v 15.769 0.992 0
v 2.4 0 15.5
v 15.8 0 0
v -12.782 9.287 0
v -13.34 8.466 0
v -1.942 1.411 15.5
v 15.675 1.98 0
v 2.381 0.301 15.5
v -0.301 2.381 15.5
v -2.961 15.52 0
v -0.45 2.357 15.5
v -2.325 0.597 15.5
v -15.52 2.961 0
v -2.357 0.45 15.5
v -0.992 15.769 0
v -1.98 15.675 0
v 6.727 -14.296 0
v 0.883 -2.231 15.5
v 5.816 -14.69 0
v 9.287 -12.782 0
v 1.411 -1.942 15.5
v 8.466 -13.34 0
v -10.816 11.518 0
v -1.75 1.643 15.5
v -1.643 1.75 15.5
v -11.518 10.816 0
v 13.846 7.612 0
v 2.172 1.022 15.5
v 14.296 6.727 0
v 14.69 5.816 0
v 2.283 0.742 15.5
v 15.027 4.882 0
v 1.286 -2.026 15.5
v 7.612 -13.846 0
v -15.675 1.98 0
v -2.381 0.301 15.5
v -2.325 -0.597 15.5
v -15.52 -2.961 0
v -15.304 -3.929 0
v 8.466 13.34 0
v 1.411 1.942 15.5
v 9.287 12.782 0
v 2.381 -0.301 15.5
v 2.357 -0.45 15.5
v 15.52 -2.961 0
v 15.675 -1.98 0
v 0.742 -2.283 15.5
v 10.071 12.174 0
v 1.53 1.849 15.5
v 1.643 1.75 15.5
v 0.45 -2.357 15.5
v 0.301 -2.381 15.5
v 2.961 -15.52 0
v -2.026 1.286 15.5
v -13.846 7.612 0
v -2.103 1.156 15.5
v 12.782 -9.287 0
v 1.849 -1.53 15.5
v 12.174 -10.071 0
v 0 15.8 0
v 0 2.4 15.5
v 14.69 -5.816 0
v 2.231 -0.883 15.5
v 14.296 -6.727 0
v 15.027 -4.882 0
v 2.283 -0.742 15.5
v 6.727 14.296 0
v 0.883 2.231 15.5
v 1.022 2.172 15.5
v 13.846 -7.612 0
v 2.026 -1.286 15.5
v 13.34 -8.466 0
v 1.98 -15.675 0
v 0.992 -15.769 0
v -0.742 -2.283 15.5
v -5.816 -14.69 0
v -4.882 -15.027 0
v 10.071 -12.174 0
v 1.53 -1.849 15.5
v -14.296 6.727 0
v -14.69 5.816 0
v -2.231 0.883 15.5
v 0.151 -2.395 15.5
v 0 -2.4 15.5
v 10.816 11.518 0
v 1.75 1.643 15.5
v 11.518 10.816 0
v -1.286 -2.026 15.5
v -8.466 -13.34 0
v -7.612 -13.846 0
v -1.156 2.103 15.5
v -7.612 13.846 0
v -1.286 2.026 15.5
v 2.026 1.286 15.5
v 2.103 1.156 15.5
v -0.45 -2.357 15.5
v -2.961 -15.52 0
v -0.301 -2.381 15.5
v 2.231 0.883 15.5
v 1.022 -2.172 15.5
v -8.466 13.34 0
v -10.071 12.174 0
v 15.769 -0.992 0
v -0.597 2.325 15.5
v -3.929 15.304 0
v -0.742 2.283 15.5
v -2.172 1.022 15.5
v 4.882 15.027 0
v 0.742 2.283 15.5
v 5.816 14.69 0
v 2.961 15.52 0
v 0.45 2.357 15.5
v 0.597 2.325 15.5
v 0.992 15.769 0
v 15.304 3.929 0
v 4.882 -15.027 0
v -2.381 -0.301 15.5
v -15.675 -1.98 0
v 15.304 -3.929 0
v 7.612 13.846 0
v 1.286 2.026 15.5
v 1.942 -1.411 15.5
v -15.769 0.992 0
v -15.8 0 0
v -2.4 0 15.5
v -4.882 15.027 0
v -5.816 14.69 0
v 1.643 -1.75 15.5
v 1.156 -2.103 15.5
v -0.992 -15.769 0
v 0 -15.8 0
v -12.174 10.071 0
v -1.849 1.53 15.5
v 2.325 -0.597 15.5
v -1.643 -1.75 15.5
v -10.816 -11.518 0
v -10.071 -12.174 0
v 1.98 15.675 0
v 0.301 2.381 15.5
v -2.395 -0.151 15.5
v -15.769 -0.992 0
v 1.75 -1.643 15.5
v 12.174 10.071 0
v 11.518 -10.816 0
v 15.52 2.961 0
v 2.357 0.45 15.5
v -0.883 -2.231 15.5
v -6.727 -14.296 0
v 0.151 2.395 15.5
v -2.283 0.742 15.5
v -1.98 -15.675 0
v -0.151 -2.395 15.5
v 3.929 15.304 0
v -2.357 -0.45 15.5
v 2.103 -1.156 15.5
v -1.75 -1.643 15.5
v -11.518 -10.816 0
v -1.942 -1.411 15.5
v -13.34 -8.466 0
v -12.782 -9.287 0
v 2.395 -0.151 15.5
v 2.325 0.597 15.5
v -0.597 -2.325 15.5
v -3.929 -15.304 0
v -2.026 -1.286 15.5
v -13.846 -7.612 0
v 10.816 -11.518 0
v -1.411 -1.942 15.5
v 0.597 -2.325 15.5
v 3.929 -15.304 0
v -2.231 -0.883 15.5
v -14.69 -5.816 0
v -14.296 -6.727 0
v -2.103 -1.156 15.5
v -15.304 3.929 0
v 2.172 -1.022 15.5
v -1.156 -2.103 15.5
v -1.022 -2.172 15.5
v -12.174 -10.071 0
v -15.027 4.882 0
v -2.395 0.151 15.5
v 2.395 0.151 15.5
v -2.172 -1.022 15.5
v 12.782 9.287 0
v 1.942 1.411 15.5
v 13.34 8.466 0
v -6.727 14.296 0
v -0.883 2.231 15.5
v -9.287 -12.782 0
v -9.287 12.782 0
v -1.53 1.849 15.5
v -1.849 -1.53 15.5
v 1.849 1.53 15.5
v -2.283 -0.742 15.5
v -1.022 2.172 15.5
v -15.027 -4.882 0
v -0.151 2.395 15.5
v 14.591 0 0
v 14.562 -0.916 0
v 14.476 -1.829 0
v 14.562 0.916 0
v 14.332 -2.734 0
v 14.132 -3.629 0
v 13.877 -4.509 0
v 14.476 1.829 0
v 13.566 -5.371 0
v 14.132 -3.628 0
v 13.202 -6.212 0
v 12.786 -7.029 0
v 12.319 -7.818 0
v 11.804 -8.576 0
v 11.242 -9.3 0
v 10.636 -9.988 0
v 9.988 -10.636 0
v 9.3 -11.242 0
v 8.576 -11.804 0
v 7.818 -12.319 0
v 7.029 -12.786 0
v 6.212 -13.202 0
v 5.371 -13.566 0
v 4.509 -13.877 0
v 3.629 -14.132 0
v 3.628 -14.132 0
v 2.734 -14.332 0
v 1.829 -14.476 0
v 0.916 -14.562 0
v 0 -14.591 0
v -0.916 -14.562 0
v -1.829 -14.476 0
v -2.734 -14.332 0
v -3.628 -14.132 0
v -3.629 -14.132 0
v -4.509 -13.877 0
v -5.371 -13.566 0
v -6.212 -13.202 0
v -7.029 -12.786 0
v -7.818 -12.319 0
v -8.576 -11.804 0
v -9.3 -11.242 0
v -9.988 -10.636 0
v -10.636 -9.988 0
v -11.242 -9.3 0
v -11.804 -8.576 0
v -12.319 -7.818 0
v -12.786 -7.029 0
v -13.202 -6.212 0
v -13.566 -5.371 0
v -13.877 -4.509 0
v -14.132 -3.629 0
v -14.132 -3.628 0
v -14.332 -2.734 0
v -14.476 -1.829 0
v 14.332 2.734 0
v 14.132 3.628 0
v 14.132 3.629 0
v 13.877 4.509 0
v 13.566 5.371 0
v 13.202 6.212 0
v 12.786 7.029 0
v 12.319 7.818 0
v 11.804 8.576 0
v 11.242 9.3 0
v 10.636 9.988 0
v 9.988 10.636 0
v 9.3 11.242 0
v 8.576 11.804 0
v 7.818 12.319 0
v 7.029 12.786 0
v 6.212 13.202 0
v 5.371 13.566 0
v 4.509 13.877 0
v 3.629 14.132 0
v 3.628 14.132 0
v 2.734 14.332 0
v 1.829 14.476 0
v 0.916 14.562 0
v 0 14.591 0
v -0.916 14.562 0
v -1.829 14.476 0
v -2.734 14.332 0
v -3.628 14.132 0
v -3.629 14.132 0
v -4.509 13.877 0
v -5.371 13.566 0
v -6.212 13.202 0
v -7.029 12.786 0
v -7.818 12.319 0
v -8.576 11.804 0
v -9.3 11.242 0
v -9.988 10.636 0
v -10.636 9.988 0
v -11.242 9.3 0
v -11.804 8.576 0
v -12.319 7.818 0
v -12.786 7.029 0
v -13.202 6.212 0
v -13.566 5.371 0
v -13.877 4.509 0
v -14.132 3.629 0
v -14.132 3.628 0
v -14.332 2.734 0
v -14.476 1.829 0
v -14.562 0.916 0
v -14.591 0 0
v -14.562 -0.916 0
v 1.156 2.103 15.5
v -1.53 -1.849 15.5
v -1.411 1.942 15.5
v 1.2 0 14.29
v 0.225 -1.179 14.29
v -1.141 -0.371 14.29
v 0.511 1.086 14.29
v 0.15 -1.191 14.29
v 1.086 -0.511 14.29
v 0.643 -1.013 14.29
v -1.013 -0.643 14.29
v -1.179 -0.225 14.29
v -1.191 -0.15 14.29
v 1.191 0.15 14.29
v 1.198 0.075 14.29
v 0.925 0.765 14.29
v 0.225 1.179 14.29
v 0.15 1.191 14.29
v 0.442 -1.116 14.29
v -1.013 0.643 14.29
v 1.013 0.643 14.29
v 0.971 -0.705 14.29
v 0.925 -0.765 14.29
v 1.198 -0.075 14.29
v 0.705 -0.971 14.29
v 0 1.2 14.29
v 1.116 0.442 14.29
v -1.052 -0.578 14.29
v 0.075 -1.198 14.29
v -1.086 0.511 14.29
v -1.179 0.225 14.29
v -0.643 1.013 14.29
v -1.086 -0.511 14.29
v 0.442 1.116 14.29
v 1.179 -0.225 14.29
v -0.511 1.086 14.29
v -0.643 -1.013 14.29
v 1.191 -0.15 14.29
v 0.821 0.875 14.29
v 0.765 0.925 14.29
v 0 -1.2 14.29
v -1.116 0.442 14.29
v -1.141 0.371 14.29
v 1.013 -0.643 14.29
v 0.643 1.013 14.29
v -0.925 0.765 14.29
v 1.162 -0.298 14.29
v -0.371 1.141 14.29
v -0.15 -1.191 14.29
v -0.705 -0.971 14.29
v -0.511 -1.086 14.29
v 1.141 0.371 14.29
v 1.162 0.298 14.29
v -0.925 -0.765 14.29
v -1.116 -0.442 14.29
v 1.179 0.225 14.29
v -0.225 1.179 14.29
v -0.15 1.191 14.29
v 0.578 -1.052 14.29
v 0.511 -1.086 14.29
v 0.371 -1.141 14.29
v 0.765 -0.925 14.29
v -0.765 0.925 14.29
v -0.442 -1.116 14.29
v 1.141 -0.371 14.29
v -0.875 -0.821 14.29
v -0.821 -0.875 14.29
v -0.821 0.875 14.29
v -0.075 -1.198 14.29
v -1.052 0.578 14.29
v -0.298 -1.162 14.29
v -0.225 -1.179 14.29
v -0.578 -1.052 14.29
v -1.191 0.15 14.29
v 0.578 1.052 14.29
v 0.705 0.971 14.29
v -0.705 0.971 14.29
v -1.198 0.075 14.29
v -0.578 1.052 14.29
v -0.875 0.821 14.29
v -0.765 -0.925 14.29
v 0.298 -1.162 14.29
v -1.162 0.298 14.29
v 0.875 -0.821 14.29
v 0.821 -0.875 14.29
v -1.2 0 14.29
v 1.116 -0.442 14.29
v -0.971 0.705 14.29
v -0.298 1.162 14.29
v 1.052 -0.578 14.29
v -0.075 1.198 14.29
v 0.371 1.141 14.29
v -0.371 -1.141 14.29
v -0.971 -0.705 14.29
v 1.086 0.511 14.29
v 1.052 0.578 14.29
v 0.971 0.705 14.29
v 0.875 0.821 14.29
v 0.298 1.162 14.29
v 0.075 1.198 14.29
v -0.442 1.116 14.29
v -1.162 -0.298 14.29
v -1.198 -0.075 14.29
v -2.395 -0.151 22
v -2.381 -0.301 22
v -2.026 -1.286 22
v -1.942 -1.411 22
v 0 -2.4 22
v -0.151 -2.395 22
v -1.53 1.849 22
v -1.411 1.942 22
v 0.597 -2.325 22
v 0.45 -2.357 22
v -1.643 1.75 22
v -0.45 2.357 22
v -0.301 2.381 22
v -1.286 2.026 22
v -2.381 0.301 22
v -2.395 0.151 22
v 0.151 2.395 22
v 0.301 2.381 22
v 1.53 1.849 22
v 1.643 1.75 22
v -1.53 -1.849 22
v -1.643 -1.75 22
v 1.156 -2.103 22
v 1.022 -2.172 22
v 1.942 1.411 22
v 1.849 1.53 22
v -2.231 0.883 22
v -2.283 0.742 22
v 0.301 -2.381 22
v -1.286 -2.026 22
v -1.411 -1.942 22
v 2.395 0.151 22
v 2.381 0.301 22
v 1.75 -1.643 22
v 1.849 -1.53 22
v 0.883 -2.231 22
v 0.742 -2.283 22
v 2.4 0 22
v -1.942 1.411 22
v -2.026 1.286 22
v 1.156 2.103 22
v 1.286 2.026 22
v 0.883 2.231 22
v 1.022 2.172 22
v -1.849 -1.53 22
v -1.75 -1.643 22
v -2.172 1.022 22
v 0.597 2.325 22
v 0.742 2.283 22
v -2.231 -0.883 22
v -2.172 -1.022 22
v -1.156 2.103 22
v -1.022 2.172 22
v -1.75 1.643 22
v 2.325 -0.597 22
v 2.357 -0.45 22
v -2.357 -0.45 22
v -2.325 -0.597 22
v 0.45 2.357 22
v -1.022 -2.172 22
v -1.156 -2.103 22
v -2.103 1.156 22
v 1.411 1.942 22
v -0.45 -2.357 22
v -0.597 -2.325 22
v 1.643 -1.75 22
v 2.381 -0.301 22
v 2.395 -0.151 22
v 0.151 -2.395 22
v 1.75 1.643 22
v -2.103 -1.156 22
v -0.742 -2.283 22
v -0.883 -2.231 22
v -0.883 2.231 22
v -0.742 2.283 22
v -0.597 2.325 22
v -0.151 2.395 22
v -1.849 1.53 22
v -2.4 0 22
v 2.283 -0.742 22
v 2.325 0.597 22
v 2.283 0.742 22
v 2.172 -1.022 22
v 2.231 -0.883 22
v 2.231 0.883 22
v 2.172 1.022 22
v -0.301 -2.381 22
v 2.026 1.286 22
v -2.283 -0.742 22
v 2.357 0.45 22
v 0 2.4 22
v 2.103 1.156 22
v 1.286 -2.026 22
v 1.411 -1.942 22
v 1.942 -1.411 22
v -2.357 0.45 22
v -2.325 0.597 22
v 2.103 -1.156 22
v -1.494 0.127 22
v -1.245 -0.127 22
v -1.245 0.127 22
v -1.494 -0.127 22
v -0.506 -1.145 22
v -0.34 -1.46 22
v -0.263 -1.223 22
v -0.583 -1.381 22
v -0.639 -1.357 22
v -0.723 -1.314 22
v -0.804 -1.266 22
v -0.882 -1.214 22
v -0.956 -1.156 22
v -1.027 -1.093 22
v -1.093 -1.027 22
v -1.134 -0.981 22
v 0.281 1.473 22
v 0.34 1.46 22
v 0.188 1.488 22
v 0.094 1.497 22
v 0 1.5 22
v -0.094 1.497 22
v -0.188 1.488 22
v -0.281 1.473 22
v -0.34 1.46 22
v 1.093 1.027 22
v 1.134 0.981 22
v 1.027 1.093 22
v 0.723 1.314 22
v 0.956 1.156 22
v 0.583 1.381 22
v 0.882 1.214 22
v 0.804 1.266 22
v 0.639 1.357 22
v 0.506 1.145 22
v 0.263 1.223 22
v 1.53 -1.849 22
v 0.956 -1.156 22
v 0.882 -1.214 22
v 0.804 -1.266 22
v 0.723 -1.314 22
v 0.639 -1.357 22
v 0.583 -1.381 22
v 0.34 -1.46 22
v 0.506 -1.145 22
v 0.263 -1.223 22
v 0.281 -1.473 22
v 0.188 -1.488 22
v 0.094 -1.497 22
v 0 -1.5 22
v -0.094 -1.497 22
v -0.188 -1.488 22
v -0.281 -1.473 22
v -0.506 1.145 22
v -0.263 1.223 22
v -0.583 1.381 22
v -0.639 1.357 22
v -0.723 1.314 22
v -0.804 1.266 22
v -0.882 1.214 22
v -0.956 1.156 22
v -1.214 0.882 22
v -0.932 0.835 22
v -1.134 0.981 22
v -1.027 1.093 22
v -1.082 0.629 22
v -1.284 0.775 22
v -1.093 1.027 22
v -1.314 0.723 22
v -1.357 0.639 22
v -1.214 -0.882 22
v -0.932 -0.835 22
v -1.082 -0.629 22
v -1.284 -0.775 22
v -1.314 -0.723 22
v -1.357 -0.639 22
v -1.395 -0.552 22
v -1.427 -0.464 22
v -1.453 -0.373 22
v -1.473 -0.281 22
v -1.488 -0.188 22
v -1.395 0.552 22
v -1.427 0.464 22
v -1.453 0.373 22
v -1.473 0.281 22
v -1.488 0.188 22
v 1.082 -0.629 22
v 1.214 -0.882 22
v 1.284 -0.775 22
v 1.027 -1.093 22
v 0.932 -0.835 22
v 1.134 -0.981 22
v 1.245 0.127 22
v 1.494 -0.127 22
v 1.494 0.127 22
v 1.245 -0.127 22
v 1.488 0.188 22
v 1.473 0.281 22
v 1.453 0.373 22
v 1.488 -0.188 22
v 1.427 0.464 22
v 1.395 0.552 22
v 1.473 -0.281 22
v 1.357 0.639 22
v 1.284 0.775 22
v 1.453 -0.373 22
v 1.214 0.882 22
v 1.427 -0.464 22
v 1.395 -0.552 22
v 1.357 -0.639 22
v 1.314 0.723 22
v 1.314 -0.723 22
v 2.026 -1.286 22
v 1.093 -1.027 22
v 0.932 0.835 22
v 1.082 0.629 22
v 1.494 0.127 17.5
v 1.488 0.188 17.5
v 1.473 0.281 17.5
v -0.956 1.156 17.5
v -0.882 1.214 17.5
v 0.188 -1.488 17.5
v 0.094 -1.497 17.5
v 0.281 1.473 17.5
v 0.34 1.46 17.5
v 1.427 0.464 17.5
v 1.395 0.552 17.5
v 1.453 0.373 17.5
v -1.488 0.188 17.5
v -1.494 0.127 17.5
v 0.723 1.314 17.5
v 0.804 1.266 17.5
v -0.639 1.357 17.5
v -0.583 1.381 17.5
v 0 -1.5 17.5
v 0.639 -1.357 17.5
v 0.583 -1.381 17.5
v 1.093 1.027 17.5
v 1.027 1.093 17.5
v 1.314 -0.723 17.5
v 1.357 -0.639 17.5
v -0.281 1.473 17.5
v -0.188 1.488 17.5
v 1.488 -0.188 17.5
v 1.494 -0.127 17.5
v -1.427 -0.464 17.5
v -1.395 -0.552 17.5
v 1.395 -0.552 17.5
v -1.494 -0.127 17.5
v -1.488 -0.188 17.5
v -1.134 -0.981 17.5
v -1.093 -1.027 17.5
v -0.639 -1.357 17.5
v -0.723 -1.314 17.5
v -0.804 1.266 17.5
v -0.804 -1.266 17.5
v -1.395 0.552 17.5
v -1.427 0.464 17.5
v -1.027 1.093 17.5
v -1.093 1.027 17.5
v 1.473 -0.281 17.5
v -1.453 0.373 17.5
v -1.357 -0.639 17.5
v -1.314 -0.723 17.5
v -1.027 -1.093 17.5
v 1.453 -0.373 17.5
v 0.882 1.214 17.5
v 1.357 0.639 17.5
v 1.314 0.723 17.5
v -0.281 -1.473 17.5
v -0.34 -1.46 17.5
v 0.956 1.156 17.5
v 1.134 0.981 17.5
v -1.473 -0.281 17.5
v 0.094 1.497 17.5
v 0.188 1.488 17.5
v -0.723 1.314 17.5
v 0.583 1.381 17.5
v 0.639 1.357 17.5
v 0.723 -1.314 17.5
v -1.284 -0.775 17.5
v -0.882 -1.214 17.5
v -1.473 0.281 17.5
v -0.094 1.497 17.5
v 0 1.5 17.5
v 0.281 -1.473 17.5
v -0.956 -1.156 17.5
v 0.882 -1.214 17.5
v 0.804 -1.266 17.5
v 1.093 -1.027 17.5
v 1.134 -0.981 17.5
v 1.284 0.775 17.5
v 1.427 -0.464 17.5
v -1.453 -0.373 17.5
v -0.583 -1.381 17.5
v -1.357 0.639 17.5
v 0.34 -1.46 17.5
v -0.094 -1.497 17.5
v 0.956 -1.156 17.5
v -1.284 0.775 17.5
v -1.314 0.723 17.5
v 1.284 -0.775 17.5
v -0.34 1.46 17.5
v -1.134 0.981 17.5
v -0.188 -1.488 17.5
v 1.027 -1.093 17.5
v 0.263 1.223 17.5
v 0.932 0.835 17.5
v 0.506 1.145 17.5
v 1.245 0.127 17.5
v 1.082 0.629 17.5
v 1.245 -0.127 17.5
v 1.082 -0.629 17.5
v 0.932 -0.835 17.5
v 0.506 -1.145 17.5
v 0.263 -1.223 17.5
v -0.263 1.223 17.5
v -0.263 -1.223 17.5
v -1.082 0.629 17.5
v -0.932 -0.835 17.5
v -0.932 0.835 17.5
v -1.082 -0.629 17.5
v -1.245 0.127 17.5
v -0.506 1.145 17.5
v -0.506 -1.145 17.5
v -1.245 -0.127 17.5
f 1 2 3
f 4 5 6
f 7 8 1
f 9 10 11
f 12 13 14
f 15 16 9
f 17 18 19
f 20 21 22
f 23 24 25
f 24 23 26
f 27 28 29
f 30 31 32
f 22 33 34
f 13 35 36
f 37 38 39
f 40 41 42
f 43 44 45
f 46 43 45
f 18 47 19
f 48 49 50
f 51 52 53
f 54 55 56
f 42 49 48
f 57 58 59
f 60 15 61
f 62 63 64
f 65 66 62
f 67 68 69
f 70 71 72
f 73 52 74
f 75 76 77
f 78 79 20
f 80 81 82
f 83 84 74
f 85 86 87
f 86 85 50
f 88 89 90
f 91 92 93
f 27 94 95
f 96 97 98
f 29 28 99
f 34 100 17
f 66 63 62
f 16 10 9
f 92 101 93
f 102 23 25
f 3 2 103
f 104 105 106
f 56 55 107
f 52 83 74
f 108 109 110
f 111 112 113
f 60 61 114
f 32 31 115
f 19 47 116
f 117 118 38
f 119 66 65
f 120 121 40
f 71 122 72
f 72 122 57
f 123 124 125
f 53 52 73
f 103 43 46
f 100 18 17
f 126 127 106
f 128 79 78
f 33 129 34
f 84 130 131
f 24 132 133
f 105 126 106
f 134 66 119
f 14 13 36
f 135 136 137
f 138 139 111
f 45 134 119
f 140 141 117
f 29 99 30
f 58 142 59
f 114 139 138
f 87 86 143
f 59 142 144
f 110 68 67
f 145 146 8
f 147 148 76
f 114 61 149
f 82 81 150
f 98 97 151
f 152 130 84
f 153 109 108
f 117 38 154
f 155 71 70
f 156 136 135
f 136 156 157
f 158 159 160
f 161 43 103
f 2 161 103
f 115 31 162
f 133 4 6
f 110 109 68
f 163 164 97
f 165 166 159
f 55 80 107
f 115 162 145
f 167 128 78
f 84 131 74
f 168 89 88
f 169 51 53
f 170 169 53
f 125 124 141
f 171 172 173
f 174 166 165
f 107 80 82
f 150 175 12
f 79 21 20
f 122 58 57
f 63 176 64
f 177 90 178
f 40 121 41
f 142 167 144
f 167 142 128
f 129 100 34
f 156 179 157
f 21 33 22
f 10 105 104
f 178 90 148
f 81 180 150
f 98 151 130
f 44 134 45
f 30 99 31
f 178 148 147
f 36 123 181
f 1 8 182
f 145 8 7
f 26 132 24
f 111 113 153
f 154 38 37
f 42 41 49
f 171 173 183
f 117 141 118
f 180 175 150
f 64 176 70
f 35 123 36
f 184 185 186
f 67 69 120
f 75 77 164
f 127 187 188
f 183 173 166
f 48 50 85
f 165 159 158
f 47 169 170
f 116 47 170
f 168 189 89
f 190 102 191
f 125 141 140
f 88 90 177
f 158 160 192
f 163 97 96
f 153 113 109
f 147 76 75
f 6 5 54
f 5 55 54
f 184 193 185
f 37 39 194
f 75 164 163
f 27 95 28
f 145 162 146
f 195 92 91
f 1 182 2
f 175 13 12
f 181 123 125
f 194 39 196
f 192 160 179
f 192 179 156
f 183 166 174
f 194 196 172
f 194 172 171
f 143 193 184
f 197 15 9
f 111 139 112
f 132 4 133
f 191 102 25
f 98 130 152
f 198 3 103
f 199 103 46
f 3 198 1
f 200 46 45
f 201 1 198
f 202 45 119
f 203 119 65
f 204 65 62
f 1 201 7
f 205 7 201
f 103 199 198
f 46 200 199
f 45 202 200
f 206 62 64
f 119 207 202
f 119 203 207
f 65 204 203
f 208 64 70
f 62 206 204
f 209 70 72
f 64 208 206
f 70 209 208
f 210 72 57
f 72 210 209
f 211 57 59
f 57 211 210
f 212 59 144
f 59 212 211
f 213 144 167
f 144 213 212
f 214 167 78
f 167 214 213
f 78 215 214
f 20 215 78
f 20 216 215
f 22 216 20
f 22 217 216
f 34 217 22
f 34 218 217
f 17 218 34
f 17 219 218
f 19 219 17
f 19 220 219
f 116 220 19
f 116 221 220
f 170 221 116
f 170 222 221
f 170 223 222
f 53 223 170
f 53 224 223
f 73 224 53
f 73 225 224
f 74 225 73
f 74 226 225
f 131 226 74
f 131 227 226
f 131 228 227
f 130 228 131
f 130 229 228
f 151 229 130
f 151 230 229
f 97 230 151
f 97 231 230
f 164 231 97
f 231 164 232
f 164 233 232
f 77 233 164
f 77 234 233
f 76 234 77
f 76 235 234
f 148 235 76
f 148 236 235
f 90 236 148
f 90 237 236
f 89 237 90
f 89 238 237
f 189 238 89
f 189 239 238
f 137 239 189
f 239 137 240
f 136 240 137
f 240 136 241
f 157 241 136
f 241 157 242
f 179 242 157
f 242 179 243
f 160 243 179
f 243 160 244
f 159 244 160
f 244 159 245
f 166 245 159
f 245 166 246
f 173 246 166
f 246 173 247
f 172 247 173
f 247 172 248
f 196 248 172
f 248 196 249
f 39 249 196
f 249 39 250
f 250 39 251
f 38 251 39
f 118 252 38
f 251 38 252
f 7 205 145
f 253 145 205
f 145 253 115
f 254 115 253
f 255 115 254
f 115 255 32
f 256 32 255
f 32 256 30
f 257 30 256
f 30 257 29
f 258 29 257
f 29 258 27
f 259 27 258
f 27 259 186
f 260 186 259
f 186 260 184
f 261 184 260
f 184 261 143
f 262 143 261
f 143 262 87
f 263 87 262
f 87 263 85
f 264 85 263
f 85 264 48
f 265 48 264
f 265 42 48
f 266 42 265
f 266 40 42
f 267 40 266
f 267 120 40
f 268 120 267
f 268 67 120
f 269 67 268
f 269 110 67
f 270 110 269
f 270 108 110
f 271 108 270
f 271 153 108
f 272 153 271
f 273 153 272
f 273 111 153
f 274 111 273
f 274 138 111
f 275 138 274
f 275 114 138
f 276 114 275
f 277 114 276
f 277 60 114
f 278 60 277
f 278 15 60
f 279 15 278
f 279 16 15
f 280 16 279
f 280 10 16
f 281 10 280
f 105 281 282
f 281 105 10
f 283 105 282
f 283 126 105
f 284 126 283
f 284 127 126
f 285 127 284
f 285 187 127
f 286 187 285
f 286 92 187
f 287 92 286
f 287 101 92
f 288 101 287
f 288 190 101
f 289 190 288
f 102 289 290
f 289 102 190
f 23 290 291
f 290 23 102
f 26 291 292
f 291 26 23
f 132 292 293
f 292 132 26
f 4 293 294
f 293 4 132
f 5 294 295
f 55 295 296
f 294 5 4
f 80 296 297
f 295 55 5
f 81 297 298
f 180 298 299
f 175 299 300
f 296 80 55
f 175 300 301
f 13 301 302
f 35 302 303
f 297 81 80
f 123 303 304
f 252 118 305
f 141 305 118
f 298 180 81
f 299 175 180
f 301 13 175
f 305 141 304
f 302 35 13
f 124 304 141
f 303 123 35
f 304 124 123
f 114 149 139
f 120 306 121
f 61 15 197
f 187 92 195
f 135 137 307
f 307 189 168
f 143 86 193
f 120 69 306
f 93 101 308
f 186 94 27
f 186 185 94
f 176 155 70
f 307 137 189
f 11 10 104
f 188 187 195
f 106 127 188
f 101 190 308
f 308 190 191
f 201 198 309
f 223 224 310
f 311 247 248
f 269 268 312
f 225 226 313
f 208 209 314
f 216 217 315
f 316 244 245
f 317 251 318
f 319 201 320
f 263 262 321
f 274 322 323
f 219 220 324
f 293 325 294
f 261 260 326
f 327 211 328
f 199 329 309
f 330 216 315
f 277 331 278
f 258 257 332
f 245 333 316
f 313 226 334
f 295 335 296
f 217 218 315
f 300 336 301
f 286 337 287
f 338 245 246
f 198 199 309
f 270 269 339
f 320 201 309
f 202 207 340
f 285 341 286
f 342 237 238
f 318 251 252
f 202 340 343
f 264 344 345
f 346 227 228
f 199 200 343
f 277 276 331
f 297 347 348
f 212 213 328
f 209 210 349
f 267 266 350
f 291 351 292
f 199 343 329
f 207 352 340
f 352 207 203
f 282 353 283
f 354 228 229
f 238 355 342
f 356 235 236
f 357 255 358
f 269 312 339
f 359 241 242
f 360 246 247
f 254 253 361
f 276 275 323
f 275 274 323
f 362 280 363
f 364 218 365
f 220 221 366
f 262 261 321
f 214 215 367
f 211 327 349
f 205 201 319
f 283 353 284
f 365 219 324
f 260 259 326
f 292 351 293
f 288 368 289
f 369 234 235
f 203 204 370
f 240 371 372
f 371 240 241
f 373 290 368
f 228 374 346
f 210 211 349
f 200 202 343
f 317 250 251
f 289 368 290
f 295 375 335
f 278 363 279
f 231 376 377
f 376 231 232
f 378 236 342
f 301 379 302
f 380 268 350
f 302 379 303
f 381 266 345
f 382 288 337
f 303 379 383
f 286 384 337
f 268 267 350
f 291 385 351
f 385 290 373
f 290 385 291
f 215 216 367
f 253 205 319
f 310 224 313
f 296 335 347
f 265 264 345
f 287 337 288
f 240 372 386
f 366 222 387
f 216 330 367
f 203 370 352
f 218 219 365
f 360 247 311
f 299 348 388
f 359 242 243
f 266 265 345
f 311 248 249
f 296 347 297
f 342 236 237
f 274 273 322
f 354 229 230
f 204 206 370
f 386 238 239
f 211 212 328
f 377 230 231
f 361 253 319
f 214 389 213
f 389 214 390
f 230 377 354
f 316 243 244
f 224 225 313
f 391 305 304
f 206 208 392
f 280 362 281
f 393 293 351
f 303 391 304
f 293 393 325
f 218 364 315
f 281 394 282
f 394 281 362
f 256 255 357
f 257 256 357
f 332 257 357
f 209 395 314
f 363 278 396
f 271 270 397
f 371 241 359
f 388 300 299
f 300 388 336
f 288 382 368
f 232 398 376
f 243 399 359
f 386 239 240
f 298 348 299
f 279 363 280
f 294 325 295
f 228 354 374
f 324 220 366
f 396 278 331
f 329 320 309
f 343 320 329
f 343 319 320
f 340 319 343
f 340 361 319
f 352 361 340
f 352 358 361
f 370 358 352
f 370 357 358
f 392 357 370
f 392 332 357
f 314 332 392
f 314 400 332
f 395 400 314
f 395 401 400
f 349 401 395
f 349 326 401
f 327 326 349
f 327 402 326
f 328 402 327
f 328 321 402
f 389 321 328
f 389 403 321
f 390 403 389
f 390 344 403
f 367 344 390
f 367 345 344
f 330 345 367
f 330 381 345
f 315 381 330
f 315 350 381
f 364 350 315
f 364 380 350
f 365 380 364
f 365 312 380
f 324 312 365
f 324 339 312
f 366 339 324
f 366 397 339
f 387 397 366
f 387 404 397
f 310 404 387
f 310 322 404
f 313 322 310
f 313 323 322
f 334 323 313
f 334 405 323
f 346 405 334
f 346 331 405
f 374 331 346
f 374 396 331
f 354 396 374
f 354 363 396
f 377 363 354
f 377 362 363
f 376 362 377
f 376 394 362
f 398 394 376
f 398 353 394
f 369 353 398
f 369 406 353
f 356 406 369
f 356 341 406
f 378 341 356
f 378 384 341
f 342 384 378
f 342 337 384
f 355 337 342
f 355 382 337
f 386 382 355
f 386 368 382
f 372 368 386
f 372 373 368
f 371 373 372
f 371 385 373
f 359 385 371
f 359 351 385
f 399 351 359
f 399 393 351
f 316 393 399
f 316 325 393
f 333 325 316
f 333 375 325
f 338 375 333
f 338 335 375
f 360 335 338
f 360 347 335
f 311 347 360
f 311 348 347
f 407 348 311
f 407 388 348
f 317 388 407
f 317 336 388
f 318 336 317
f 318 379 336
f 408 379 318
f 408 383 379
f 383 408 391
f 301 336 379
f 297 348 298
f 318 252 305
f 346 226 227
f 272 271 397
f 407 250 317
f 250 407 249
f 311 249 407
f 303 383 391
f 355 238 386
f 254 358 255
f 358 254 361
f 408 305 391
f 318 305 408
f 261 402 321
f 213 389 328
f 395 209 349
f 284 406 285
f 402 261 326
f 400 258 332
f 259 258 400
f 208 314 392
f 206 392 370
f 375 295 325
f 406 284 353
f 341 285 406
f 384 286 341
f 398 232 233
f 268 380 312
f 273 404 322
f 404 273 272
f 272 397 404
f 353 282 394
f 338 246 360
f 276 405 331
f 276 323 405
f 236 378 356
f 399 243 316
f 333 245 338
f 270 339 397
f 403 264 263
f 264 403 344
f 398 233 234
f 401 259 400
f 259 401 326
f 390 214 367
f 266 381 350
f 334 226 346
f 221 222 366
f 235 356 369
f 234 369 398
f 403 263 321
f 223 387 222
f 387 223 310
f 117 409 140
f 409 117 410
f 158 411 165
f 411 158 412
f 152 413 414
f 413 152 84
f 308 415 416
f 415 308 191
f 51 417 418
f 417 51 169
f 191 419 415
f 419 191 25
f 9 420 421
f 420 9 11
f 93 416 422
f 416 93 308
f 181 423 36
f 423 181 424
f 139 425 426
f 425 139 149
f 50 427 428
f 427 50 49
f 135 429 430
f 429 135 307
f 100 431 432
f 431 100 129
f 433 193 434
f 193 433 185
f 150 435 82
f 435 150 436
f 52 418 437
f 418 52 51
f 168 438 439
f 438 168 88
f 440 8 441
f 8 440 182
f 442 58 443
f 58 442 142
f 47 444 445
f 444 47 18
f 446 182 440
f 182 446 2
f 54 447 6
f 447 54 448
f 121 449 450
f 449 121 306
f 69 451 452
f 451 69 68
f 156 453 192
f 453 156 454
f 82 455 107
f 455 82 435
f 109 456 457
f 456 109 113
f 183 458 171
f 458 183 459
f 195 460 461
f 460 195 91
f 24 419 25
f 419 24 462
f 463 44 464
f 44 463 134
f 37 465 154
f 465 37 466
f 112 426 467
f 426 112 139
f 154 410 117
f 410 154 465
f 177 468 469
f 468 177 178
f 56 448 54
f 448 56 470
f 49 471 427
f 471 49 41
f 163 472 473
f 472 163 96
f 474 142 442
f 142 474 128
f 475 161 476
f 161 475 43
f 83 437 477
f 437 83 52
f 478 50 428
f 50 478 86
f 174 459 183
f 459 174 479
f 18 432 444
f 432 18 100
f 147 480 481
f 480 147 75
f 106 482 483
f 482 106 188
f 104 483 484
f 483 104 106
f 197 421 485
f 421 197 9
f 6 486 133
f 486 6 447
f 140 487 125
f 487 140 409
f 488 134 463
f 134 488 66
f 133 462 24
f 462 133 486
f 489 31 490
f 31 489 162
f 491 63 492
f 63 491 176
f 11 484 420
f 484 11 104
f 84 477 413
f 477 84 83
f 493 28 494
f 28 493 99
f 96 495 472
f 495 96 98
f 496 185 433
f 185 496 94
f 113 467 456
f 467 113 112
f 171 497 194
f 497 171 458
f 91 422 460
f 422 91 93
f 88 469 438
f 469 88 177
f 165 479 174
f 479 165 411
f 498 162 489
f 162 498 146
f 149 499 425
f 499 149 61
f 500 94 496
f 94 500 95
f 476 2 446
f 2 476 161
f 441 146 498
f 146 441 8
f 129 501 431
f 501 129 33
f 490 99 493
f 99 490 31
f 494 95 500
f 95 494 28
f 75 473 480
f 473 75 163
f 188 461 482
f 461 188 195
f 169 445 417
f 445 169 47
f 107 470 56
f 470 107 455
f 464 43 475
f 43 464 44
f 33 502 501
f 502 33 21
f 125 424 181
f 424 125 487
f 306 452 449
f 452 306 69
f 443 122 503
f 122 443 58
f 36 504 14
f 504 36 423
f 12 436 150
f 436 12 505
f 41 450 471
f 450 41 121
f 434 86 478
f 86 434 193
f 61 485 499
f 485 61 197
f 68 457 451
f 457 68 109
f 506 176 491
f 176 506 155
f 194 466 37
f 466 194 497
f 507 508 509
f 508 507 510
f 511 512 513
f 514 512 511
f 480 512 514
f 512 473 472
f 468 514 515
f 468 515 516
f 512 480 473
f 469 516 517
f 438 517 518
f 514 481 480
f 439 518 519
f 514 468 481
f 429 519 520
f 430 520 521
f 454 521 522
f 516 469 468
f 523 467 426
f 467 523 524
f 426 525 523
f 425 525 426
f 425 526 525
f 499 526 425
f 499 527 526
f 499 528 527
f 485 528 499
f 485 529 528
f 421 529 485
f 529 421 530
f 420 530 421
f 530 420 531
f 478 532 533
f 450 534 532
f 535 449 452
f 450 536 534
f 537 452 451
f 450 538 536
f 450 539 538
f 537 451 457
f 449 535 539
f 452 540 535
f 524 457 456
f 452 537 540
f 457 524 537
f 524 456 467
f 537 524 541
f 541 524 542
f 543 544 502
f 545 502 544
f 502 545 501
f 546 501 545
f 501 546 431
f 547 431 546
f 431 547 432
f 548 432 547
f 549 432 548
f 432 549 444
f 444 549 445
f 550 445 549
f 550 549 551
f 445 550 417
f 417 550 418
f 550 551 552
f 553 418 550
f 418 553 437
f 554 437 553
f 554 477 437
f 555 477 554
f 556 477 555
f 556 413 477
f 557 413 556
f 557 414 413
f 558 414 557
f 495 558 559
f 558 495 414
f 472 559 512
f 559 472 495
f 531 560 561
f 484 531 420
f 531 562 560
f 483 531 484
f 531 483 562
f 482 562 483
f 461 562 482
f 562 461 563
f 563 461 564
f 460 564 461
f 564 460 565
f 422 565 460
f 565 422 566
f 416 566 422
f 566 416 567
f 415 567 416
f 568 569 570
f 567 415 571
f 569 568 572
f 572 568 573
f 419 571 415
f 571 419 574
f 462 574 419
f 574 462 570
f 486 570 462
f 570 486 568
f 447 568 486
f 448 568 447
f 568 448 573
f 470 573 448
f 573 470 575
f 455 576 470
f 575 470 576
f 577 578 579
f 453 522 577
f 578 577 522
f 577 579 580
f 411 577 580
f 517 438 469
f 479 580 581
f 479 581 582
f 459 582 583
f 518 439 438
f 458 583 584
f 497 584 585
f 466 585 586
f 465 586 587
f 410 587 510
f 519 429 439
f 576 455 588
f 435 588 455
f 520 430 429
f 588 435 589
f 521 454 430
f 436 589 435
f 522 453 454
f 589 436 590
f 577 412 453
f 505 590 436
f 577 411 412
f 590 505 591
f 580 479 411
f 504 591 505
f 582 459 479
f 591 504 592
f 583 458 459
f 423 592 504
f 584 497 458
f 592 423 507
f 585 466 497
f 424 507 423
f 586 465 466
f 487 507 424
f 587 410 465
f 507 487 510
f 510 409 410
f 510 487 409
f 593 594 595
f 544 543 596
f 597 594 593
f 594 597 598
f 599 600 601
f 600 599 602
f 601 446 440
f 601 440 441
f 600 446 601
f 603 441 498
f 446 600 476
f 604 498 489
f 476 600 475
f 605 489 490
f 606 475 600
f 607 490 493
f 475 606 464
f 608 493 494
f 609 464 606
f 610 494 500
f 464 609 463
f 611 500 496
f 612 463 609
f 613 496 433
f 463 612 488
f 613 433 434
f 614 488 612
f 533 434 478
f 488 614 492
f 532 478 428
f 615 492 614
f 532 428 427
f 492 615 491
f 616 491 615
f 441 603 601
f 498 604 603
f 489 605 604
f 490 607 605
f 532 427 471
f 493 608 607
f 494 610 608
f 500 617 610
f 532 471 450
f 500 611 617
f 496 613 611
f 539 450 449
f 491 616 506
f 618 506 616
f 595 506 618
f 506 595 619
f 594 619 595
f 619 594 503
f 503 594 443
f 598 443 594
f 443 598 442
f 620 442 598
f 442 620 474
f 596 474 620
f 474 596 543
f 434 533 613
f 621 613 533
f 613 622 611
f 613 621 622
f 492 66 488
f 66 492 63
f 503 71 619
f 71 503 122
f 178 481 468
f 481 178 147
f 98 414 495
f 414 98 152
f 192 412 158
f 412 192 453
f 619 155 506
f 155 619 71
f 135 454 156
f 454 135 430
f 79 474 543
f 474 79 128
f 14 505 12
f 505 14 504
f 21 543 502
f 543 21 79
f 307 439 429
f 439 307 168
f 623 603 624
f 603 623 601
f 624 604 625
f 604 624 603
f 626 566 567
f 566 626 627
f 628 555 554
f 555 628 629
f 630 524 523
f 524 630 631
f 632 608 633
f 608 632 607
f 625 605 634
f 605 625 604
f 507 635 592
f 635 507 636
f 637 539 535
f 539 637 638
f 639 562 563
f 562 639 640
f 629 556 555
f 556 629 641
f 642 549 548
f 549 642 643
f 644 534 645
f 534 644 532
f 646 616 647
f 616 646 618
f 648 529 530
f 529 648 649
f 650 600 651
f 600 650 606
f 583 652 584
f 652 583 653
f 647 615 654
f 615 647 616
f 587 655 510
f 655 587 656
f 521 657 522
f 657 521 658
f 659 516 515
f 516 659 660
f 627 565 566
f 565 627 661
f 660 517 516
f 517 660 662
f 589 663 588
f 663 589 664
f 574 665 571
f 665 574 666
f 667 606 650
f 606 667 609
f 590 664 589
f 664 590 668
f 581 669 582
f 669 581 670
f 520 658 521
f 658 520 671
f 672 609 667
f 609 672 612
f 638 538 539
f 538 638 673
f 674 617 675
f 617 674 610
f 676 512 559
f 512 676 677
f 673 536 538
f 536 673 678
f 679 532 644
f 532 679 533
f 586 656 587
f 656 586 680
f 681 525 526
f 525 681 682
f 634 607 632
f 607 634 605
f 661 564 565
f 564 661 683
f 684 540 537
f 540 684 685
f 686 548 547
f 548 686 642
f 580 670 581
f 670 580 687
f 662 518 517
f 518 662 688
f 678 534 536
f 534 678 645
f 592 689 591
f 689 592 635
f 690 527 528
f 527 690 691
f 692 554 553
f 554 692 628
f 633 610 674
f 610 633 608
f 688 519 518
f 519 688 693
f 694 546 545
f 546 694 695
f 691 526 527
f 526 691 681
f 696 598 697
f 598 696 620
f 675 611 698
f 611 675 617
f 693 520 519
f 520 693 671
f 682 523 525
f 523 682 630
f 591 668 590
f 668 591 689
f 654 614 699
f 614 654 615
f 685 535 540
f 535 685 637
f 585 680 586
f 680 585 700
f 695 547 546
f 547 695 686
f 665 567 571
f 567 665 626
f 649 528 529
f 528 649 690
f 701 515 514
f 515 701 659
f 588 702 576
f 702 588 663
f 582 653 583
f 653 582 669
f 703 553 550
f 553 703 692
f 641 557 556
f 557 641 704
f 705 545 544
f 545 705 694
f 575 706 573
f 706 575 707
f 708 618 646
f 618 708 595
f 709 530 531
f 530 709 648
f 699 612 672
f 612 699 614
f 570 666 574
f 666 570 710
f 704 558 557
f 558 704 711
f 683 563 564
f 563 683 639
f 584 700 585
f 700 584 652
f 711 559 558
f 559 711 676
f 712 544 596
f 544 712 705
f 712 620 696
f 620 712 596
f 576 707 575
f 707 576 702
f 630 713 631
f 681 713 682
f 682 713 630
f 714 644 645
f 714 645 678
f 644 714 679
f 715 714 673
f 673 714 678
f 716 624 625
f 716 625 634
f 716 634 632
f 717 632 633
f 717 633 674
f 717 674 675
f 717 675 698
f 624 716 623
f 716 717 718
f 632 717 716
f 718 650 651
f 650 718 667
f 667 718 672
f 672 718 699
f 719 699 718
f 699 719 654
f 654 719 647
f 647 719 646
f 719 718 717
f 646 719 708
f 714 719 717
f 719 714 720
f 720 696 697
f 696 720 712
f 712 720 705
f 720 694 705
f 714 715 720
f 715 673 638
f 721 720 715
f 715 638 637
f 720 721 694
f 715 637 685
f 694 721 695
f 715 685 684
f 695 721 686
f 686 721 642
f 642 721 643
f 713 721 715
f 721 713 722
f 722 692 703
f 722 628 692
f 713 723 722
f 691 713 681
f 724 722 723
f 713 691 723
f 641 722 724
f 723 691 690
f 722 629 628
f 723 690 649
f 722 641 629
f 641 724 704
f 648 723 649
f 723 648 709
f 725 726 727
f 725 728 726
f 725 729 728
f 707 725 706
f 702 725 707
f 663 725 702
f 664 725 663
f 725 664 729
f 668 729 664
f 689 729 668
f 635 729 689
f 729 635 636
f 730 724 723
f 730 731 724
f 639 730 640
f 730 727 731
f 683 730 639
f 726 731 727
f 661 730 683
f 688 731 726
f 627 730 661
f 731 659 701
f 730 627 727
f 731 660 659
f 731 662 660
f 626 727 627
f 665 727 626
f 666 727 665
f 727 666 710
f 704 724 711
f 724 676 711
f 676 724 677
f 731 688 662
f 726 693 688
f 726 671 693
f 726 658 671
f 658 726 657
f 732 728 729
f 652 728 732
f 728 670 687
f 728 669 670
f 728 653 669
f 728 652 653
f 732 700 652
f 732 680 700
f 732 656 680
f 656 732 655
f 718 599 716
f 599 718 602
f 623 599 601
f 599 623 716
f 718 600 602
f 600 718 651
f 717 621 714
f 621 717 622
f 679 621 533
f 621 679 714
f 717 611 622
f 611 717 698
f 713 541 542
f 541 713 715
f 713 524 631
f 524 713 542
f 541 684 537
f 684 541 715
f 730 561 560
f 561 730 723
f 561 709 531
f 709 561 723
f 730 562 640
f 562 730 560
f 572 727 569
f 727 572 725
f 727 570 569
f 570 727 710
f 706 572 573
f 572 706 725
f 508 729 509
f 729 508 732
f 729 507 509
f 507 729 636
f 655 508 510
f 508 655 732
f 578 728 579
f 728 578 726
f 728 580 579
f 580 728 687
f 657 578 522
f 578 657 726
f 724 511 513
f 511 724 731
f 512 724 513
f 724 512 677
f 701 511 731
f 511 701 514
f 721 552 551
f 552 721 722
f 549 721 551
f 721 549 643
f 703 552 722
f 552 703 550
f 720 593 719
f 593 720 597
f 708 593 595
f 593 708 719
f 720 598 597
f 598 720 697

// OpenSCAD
$fn=100;
pad=0.01;

//cone params
cone_caliber=15.8; //(.625 inches in mm ) / 2 - fudge
cone_thickness=1.2;
cone_height=15.5;

//bolt cup params
bolt_radius=1.5;
cup_height=6.5;
cup_thickness=.9;

//bolt cup spine params
spine_thickness=.255;
spine_count=10;


//cone
module cone() {
	difference() {
		cylinder( h = cone_height, r1=cone_caliber, r2=bolt_radius+cup_thickness);
		translate([0,0,0-pad]){
			cylinder( h = cone_height-cone_thickness, r1=cone_caliber-cone_thickness, r2=bolt_radius+cup_thickness-cone_thickness);
		}
	};
};

//bolt cup
module bolt_cup() {
	//cup
	difference() {
		cylinder( h = cup_height, r = bolt_radius+cup_thickness);
		translate([0,0,2]){
			cylinder( h = cup_height-cup_thickness+pad, r = bolt_radius);
		}
	}; 
	
	//cup spines
	for (i=[0:spine_count-1]) {
		rotate( i*360/spine_count, [0,0,1] ) {
			translate([bolt_radius-spine_thickness,-(spine_thickness/2),0]){
				cube([spine_thickness,spine_thickness,cup_height]);
			}
		}
	};
};

cone();
translate([0,0,cone_height]){
	bolt_cup();
}
